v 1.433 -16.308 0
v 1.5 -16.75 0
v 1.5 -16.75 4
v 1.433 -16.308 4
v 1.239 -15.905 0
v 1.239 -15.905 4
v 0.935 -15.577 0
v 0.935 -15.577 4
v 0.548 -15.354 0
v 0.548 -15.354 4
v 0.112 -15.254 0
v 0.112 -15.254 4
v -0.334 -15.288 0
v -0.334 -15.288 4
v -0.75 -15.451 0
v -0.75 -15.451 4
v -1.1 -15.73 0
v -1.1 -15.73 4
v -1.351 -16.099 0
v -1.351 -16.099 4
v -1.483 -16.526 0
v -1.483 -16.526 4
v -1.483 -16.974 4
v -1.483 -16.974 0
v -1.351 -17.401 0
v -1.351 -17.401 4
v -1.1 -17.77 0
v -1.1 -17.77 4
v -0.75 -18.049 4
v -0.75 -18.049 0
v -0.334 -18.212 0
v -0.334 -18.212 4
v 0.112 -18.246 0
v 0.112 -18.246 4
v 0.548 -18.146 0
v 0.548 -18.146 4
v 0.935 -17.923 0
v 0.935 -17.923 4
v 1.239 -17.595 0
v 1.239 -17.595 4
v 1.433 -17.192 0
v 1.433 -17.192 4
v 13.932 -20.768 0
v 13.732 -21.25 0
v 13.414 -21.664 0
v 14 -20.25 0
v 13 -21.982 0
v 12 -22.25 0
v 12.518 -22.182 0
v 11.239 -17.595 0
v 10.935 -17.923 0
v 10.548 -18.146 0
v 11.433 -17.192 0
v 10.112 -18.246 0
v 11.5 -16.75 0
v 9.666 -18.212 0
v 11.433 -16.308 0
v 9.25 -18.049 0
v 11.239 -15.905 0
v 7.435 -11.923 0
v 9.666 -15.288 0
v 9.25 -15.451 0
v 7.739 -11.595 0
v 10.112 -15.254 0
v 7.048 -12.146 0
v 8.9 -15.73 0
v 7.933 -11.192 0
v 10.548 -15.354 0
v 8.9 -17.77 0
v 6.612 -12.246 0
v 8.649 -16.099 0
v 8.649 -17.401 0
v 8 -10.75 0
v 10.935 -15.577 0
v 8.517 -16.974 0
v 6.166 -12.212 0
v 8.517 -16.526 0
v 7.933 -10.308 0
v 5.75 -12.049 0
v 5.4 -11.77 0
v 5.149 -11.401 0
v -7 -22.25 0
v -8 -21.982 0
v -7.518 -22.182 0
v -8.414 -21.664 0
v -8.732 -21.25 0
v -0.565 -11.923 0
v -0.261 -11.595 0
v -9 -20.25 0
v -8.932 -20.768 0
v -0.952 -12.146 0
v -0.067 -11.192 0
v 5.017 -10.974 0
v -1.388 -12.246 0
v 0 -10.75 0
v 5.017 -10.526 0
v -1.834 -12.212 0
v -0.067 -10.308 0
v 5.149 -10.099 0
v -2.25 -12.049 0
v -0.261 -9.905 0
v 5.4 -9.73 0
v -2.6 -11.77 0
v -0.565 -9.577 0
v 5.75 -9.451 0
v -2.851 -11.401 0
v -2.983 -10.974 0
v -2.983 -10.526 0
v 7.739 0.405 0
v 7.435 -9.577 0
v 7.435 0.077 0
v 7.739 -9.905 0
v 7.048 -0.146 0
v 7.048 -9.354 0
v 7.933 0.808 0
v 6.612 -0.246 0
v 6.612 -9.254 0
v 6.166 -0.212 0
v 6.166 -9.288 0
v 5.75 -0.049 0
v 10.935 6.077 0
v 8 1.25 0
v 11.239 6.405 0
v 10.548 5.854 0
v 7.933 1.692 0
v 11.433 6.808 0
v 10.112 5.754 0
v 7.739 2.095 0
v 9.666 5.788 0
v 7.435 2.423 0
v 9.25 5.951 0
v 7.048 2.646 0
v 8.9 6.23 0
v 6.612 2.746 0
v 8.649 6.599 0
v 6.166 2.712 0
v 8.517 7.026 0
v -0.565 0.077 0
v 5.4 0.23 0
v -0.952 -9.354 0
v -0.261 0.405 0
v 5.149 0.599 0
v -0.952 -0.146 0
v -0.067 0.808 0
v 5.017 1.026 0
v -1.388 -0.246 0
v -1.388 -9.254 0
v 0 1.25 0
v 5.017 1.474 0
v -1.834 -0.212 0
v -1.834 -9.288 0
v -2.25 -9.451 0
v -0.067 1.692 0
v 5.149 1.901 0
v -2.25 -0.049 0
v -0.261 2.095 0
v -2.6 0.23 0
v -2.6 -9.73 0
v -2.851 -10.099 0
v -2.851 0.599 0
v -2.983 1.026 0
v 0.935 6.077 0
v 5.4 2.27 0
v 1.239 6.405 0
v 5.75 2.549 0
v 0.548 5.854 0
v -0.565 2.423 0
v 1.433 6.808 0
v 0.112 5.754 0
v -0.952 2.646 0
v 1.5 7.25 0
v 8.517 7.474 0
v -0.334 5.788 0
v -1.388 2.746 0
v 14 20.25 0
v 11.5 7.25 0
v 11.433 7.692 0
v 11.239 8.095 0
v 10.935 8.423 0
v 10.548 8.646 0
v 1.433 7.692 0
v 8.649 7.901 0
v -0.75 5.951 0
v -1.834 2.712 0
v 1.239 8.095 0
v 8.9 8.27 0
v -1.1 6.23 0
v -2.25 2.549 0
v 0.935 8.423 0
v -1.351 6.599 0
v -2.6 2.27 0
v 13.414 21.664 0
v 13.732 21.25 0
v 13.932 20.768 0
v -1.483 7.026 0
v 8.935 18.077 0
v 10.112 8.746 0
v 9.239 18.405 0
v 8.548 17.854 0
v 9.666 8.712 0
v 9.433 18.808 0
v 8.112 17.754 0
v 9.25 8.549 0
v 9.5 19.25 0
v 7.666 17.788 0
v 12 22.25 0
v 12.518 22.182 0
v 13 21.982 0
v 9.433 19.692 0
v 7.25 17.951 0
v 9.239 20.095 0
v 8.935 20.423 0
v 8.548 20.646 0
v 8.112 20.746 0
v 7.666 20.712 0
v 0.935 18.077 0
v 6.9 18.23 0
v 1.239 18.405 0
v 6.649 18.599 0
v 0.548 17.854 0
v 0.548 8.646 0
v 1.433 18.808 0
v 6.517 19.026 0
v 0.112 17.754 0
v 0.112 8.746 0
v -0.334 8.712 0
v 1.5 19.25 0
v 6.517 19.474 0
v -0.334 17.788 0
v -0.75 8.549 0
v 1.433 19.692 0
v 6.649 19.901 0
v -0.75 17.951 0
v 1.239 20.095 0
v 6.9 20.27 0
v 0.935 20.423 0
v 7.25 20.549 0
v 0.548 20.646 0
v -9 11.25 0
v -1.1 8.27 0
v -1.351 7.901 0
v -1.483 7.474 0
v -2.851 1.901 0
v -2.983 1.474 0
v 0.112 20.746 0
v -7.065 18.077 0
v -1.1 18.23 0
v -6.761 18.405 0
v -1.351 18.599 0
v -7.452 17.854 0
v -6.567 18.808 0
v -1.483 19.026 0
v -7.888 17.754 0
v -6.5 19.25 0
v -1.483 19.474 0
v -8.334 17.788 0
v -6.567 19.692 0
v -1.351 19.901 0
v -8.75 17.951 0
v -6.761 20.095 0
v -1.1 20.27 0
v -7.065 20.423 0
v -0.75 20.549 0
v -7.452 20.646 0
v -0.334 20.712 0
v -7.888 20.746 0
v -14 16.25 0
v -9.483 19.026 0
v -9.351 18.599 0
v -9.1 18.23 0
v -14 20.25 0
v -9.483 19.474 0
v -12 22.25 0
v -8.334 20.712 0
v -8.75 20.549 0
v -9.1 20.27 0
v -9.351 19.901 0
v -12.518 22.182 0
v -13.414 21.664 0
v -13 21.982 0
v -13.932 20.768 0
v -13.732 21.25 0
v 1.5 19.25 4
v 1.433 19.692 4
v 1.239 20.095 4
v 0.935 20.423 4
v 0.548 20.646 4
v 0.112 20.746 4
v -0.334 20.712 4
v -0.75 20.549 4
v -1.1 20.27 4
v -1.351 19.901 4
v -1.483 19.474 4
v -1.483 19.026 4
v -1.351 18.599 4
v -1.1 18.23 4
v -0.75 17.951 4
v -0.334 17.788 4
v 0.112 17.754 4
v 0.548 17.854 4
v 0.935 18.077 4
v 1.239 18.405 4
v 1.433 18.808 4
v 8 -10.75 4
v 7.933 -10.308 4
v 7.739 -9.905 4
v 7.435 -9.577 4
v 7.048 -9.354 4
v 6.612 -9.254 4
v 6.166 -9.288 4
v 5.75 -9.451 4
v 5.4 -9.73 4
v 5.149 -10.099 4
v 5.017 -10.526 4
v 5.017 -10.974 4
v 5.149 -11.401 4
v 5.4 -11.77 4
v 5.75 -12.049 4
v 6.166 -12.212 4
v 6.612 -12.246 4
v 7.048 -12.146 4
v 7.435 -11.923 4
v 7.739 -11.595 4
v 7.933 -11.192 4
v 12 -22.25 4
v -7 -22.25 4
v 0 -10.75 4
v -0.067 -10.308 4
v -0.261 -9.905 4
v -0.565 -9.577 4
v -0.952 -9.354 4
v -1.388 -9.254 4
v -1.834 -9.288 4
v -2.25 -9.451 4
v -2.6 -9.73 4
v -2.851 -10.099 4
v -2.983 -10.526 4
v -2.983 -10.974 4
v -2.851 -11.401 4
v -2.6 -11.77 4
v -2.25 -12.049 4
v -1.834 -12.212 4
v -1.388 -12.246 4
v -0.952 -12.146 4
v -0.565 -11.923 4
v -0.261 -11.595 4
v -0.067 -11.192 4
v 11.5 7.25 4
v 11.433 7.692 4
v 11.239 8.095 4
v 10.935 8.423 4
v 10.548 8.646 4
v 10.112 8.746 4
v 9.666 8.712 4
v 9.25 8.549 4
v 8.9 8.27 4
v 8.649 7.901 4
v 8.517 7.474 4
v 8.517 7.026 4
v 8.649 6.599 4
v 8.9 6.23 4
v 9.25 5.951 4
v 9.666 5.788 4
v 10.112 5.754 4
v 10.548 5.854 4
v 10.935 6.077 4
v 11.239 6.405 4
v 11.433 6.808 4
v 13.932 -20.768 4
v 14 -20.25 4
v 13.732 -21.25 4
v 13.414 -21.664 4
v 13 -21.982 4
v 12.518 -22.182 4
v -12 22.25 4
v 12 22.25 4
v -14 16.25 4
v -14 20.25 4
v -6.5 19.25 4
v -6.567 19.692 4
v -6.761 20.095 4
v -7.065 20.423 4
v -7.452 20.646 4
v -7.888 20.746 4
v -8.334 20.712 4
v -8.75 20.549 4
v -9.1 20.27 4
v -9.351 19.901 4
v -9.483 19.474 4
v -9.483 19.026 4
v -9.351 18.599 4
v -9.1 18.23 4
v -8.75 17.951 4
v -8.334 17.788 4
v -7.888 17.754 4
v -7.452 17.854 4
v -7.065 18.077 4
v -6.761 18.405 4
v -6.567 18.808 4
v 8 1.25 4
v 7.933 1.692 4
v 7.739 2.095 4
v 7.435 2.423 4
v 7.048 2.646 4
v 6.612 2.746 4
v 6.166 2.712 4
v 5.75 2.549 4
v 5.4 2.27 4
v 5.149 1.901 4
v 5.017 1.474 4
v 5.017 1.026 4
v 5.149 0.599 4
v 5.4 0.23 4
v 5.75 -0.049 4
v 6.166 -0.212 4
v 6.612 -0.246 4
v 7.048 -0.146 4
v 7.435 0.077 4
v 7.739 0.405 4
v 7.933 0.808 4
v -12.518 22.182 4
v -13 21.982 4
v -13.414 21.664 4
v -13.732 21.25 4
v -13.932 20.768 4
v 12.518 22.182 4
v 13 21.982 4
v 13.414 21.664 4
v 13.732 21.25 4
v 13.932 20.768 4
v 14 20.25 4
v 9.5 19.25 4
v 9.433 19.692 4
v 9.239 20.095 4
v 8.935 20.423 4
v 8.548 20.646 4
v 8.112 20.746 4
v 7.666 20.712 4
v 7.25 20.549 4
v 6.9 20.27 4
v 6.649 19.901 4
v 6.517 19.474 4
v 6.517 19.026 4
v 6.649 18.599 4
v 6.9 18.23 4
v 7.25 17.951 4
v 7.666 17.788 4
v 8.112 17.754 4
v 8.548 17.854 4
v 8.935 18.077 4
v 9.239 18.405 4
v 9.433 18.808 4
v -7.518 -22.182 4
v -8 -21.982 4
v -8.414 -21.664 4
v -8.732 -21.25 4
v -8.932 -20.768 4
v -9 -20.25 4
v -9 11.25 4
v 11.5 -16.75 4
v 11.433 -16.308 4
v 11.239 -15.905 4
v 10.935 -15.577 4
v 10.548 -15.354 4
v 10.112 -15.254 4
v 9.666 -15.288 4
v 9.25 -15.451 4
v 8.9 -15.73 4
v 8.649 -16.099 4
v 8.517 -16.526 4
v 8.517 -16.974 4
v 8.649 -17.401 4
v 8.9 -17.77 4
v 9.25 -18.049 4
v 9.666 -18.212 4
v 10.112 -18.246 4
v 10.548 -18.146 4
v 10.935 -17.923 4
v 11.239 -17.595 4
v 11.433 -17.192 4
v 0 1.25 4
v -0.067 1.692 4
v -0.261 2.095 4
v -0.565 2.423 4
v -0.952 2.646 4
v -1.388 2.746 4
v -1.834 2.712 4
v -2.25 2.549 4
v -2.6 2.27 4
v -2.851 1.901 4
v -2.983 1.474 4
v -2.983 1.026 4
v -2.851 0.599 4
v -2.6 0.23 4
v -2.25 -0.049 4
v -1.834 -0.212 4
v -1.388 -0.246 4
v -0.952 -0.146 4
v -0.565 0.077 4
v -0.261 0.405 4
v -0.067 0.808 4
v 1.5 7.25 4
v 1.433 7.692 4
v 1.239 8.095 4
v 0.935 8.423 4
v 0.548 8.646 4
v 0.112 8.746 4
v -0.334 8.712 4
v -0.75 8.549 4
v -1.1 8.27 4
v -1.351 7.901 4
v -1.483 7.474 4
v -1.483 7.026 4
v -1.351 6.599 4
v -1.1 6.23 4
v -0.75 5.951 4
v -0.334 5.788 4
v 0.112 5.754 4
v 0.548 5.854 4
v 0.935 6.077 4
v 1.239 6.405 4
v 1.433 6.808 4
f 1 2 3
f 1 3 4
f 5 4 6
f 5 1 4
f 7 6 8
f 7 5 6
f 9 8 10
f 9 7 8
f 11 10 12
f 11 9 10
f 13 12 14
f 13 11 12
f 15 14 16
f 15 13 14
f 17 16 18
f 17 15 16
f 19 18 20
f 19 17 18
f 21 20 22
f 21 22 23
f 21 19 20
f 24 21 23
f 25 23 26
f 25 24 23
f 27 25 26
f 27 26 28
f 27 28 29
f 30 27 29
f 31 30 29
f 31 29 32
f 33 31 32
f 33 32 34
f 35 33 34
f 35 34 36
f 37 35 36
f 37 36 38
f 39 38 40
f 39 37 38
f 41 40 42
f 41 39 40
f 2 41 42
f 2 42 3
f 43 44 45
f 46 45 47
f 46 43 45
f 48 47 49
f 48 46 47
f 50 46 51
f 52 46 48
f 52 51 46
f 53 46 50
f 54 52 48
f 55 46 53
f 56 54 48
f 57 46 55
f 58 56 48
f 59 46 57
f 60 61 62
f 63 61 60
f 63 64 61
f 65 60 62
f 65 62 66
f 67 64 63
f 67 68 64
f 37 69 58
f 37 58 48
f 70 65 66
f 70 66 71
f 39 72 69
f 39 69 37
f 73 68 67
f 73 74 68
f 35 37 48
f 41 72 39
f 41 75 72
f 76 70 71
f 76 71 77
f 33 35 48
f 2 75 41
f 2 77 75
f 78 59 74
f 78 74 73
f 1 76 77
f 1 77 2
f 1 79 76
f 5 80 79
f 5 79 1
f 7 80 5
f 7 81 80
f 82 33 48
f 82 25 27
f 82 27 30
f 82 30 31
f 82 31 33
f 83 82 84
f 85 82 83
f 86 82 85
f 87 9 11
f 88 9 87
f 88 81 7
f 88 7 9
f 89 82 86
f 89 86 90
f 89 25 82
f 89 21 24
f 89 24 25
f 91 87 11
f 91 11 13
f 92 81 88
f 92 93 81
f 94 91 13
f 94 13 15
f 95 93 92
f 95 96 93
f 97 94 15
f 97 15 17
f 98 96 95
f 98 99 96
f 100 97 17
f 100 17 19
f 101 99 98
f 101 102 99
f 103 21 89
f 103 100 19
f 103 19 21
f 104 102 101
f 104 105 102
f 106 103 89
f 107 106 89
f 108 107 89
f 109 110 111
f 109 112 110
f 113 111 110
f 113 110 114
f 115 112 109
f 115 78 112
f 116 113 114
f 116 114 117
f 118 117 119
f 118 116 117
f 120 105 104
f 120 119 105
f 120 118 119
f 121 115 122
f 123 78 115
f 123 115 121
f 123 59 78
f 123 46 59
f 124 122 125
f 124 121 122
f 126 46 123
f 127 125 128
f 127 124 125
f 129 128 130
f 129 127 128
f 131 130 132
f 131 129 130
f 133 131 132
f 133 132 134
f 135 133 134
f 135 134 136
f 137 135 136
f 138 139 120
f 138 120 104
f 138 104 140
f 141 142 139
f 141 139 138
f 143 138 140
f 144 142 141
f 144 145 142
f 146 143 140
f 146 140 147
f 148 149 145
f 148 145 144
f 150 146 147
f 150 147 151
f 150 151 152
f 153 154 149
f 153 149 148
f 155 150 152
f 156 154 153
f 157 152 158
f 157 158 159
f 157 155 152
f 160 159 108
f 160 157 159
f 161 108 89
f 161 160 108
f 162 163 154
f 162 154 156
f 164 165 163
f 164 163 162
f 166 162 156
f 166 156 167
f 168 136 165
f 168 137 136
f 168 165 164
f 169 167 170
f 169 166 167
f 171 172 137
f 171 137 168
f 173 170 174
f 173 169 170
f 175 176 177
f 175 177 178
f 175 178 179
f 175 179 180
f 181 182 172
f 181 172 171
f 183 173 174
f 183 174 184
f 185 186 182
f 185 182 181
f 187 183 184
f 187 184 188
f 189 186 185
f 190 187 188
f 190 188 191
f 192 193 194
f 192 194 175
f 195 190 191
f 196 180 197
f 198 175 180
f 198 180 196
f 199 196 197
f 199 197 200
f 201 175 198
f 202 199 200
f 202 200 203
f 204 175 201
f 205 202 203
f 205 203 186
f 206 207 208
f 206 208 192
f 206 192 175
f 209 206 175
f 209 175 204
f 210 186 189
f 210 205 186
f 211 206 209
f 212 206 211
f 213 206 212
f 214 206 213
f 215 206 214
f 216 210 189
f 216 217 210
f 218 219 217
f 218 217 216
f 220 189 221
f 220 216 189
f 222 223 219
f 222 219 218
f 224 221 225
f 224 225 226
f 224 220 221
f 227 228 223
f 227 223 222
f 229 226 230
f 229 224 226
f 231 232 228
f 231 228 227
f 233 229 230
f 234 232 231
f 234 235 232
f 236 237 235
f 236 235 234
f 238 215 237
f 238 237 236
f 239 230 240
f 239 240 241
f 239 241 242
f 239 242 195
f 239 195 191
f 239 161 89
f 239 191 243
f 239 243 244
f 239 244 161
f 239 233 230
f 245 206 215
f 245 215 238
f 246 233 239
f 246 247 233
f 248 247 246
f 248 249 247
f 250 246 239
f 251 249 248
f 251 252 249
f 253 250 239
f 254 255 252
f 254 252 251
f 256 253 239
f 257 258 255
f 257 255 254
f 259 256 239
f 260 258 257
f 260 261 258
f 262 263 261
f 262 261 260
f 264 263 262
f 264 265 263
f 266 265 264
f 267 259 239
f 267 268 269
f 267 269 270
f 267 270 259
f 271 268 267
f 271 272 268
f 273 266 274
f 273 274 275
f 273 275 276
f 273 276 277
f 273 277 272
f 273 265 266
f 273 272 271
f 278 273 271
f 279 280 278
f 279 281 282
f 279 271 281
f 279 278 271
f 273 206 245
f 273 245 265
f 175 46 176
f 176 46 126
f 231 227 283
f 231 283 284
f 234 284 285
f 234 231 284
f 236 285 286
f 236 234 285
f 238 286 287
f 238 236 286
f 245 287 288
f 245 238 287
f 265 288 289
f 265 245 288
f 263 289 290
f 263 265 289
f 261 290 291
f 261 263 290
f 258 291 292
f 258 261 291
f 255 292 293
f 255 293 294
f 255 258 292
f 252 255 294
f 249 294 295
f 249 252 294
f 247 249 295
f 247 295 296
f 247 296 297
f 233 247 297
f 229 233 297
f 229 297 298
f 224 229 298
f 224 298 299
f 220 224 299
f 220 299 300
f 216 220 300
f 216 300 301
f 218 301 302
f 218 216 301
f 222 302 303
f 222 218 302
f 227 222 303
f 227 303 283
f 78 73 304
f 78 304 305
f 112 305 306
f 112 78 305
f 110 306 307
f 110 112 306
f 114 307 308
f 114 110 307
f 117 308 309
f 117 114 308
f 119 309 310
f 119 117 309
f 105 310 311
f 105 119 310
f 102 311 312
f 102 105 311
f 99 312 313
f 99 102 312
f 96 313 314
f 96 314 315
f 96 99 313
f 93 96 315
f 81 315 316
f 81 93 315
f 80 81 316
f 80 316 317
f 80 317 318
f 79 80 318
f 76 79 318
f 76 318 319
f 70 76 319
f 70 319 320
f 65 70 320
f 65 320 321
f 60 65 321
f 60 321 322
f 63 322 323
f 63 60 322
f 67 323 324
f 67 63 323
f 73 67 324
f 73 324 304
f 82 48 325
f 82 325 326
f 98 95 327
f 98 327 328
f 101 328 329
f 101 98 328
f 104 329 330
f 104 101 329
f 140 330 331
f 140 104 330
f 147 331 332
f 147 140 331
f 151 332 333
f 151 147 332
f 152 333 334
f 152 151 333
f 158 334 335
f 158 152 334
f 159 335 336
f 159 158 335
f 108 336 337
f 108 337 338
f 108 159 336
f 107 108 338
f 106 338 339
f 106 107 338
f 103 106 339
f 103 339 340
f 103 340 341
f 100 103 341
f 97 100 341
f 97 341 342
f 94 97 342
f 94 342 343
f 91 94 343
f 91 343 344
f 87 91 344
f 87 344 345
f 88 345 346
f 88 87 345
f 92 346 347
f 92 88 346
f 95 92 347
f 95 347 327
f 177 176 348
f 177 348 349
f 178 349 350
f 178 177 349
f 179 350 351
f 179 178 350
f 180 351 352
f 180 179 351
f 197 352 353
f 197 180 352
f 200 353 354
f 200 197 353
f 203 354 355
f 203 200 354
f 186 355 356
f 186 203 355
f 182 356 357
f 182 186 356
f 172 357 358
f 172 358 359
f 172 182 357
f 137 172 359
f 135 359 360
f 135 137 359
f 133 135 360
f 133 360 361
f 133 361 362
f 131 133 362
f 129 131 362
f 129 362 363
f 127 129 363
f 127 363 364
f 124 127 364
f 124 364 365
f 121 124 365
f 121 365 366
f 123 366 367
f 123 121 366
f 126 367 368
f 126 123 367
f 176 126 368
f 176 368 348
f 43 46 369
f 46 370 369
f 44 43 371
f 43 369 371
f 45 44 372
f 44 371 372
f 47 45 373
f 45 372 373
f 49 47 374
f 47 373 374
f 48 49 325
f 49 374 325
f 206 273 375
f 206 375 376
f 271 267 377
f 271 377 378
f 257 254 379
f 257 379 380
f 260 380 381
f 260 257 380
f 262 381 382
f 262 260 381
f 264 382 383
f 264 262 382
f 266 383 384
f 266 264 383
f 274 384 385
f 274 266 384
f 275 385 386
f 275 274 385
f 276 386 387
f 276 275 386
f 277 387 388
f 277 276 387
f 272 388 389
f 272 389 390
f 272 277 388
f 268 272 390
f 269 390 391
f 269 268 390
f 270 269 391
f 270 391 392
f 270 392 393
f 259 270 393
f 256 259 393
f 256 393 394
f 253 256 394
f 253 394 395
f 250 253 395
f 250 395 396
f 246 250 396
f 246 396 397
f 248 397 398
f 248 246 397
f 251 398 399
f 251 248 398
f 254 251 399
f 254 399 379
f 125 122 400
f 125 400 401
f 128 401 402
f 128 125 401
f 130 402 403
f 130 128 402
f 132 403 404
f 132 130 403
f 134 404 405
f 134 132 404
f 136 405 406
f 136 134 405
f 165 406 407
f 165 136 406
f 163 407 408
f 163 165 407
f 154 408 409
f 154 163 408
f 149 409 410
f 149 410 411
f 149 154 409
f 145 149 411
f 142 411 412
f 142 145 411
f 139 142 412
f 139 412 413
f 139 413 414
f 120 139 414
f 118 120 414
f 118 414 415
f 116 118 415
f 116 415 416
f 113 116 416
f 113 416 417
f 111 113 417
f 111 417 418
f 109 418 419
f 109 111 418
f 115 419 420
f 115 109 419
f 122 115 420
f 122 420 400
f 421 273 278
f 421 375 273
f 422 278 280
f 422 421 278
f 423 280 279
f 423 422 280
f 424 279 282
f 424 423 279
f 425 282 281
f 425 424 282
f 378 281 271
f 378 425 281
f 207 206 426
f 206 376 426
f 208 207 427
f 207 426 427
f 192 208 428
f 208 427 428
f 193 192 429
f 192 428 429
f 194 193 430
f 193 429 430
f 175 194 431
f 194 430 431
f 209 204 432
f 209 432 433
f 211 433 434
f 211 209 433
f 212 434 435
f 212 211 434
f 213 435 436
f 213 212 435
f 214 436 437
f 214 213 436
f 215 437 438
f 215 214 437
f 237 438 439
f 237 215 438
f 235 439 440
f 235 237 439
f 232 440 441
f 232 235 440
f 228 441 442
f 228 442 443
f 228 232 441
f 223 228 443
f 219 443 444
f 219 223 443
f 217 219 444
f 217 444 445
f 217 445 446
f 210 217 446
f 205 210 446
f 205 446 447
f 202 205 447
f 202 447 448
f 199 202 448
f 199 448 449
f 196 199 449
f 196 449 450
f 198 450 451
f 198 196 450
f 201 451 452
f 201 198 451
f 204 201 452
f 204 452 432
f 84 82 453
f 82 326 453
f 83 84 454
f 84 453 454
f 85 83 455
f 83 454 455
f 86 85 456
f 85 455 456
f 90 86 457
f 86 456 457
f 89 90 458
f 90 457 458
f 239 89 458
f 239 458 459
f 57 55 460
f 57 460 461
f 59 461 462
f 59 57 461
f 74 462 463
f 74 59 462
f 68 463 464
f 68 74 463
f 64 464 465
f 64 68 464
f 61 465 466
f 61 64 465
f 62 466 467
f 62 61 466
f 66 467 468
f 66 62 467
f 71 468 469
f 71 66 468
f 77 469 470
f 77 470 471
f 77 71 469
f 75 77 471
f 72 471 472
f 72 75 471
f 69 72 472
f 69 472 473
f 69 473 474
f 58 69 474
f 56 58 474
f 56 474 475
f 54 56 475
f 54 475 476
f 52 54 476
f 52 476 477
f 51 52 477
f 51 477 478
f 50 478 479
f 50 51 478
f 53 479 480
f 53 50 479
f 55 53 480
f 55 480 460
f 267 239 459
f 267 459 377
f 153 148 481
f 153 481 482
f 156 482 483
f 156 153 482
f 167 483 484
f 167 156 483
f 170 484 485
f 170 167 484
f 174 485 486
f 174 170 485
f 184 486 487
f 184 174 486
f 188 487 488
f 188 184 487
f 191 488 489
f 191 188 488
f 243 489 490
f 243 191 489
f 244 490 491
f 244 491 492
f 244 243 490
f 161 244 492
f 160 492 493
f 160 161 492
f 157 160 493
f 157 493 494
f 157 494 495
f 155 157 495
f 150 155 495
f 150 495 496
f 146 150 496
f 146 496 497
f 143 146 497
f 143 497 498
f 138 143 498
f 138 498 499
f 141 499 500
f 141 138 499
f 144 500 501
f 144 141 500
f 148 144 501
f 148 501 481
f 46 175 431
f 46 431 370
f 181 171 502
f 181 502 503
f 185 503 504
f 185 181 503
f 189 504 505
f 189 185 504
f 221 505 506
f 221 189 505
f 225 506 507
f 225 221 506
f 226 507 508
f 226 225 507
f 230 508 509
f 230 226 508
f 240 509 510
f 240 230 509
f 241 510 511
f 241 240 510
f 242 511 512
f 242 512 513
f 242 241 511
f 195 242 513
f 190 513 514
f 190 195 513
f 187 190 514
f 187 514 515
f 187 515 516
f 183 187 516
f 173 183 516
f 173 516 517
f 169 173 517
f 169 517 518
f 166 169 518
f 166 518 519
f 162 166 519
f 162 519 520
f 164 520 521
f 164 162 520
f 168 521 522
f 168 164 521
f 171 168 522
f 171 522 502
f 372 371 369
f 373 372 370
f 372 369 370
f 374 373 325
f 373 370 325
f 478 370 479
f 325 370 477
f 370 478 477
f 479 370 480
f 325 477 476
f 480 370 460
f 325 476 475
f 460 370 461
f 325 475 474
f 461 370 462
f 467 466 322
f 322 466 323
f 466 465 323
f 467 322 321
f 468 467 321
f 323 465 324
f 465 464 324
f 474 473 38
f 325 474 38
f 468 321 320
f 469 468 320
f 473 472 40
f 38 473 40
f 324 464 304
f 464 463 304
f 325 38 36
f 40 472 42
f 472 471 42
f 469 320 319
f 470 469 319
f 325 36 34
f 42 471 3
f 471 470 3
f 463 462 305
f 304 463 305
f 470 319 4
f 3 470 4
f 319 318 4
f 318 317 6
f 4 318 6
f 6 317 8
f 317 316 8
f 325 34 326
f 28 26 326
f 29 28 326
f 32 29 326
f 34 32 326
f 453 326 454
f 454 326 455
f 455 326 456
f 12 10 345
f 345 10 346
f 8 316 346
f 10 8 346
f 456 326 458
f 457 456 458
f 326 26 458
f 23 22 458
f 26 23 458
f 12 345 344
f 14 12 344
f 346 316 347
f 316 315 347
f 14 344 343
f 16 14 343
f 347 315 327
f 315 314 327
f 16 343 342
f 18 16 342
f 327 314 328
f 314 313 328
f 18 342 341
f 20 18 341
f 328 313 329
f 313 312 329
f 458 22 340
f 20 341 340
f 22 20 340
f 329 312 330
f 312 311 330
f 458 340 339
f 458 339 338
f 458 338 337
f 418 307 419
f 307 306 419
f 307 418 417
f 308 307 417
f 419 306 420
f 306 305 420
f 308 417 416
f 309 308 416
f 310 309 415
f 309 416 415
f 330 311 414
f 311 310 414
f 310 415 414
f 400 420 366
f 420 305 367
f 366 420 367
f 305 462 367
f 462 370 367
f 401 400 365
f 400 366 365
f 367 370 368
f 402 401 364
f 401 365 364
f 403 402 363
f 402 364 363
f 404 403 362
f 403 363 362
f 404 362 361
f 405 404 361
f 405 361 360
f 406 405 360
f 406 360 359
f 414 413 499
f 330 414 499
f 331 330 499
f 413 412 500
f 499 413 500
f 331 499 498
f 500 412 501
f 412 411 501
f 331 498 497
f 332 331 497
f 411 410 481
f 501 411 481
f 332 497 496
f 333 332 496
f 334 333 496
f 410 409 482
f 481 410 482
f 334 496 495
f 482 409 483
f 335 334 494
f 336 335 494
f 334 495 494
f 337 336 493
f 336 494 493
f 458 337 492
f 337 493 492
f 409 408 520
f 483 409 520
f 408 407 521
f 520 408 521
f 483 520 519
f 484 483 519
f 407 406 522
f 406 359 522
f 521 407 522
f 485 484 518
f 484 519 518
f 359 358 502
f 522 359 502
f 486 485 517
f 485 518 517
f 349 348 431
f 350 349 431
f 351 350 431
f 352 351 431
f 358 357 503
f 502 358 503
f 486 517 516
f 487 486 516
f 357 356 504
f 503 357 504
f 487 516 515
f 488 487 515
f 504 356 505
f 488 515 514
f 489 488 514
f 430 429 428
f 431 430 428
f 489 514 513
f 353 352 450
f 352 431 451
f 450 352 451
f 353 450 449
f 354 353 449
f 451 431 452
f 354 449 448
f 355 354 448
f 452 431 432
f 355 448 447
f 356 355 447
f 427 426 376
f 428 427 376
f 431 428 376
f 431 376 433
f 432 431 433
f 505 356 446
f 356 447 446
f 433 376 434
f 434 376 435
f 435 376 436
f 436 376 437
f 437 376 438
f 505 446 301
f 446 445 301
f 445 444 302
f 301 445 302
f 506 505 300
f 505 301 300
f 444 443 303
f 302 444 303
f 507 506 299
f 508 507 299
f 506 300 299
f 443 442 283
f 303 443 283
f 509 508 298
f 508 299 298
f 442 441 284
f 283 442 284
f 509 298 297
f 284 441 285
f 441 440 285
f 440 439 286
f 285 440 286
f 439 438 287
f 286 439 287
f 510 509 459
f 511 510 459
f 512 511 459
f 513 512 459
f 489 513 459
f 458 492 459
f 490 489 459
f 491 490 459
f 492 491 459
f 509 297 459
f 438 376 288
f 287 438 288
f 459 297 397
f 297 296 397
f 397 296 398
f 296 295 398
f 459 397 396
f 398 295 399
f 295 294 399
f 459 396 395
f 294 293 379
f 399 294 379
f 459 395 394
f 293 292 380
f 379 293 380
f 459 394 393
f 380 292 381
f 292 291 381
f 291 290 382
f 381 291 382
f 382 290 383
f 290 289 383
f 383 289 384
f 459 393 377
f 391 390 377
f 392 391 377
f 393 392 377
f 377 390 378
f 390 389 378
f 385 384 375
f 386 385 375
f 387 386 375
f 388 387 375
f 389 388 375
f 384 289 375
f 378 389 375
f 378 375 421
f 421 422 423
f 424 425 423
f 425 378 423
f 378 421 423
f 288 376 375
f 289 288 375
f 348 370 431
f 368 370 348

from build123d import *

# Parameters (mm, degrees)
SKETCH_2_R      = 1.5
EXTRUDE_1_DEPTH = 4
FILLET_1_R      = 2


with BuildPart() as part:
    # 草图2 → 凸台-拉伸1 (new body)
    with BuildSketch(Plane.XY):
        Polygon((-14, 22.25), (14, 22.25), (14, -22.25), (-9, -22.25), (-9, 11.25), (-14, 16.25), align=None)
        with Locations((0, 7.25)):
            Circle(SKETCH_2_R, mode=Mode.SUBTRACT)
        with Locations((-1.5, 1.25)):
            Circle(SKETCH_2_R, mode=Mode.SUBTRACT)
        with Locations((6.5, 1.25)):
            Circle(SKETCH_2_R, mode=Mode.SUBTRACT)
        with Locations((-1.5, -10.75)):
            Circle(SKETCH_2_R, mode=Mode.SUBTRACT)
        with Locations((6.5, -10.75)):
            Circle(SKETCH_2_R, mode=Mode.SUBTRACT)
        with Locations((10, 7.25)):
            Circle(SKETCH_2_R, mode=Mode.SUBTRACT)
        with Locations((0, -16.75)):
            Circle(SKETCH_2_R, mode=Mode.SUBTRACT)
        with Locations((10, -16.75)):
            Circle(SKETCH_2_R, mode=Mode.SUBTRACT)
        with Locations((8, 19.25)):
            Circle(SKETCH_2_R, mode=Mode.SUBTRACT)
        with Locations((0, 19.25)):
            Circle(SKETCH_2_R, mode=Mode.SUBTRACT)
        with Locations((-8, 19.25)):
            Circle(SKETCH_2_R, mode=Mode.SUBTRACT)
    extrude(amount=EXTRUDE_1_DEPTH)

    # 圆角1
    fillet_1_edges = [part.edges().sort_by_distance(p)[0] for p in [
        (14, -22.25, 2),
        (-9, -22.25, 2),
        (-14, 22.25, 2),
        (14, 22.25, 2),
    ]]
    fillet(fillet_1_edges, radius=FILLET_1_R)


solid = part.part
